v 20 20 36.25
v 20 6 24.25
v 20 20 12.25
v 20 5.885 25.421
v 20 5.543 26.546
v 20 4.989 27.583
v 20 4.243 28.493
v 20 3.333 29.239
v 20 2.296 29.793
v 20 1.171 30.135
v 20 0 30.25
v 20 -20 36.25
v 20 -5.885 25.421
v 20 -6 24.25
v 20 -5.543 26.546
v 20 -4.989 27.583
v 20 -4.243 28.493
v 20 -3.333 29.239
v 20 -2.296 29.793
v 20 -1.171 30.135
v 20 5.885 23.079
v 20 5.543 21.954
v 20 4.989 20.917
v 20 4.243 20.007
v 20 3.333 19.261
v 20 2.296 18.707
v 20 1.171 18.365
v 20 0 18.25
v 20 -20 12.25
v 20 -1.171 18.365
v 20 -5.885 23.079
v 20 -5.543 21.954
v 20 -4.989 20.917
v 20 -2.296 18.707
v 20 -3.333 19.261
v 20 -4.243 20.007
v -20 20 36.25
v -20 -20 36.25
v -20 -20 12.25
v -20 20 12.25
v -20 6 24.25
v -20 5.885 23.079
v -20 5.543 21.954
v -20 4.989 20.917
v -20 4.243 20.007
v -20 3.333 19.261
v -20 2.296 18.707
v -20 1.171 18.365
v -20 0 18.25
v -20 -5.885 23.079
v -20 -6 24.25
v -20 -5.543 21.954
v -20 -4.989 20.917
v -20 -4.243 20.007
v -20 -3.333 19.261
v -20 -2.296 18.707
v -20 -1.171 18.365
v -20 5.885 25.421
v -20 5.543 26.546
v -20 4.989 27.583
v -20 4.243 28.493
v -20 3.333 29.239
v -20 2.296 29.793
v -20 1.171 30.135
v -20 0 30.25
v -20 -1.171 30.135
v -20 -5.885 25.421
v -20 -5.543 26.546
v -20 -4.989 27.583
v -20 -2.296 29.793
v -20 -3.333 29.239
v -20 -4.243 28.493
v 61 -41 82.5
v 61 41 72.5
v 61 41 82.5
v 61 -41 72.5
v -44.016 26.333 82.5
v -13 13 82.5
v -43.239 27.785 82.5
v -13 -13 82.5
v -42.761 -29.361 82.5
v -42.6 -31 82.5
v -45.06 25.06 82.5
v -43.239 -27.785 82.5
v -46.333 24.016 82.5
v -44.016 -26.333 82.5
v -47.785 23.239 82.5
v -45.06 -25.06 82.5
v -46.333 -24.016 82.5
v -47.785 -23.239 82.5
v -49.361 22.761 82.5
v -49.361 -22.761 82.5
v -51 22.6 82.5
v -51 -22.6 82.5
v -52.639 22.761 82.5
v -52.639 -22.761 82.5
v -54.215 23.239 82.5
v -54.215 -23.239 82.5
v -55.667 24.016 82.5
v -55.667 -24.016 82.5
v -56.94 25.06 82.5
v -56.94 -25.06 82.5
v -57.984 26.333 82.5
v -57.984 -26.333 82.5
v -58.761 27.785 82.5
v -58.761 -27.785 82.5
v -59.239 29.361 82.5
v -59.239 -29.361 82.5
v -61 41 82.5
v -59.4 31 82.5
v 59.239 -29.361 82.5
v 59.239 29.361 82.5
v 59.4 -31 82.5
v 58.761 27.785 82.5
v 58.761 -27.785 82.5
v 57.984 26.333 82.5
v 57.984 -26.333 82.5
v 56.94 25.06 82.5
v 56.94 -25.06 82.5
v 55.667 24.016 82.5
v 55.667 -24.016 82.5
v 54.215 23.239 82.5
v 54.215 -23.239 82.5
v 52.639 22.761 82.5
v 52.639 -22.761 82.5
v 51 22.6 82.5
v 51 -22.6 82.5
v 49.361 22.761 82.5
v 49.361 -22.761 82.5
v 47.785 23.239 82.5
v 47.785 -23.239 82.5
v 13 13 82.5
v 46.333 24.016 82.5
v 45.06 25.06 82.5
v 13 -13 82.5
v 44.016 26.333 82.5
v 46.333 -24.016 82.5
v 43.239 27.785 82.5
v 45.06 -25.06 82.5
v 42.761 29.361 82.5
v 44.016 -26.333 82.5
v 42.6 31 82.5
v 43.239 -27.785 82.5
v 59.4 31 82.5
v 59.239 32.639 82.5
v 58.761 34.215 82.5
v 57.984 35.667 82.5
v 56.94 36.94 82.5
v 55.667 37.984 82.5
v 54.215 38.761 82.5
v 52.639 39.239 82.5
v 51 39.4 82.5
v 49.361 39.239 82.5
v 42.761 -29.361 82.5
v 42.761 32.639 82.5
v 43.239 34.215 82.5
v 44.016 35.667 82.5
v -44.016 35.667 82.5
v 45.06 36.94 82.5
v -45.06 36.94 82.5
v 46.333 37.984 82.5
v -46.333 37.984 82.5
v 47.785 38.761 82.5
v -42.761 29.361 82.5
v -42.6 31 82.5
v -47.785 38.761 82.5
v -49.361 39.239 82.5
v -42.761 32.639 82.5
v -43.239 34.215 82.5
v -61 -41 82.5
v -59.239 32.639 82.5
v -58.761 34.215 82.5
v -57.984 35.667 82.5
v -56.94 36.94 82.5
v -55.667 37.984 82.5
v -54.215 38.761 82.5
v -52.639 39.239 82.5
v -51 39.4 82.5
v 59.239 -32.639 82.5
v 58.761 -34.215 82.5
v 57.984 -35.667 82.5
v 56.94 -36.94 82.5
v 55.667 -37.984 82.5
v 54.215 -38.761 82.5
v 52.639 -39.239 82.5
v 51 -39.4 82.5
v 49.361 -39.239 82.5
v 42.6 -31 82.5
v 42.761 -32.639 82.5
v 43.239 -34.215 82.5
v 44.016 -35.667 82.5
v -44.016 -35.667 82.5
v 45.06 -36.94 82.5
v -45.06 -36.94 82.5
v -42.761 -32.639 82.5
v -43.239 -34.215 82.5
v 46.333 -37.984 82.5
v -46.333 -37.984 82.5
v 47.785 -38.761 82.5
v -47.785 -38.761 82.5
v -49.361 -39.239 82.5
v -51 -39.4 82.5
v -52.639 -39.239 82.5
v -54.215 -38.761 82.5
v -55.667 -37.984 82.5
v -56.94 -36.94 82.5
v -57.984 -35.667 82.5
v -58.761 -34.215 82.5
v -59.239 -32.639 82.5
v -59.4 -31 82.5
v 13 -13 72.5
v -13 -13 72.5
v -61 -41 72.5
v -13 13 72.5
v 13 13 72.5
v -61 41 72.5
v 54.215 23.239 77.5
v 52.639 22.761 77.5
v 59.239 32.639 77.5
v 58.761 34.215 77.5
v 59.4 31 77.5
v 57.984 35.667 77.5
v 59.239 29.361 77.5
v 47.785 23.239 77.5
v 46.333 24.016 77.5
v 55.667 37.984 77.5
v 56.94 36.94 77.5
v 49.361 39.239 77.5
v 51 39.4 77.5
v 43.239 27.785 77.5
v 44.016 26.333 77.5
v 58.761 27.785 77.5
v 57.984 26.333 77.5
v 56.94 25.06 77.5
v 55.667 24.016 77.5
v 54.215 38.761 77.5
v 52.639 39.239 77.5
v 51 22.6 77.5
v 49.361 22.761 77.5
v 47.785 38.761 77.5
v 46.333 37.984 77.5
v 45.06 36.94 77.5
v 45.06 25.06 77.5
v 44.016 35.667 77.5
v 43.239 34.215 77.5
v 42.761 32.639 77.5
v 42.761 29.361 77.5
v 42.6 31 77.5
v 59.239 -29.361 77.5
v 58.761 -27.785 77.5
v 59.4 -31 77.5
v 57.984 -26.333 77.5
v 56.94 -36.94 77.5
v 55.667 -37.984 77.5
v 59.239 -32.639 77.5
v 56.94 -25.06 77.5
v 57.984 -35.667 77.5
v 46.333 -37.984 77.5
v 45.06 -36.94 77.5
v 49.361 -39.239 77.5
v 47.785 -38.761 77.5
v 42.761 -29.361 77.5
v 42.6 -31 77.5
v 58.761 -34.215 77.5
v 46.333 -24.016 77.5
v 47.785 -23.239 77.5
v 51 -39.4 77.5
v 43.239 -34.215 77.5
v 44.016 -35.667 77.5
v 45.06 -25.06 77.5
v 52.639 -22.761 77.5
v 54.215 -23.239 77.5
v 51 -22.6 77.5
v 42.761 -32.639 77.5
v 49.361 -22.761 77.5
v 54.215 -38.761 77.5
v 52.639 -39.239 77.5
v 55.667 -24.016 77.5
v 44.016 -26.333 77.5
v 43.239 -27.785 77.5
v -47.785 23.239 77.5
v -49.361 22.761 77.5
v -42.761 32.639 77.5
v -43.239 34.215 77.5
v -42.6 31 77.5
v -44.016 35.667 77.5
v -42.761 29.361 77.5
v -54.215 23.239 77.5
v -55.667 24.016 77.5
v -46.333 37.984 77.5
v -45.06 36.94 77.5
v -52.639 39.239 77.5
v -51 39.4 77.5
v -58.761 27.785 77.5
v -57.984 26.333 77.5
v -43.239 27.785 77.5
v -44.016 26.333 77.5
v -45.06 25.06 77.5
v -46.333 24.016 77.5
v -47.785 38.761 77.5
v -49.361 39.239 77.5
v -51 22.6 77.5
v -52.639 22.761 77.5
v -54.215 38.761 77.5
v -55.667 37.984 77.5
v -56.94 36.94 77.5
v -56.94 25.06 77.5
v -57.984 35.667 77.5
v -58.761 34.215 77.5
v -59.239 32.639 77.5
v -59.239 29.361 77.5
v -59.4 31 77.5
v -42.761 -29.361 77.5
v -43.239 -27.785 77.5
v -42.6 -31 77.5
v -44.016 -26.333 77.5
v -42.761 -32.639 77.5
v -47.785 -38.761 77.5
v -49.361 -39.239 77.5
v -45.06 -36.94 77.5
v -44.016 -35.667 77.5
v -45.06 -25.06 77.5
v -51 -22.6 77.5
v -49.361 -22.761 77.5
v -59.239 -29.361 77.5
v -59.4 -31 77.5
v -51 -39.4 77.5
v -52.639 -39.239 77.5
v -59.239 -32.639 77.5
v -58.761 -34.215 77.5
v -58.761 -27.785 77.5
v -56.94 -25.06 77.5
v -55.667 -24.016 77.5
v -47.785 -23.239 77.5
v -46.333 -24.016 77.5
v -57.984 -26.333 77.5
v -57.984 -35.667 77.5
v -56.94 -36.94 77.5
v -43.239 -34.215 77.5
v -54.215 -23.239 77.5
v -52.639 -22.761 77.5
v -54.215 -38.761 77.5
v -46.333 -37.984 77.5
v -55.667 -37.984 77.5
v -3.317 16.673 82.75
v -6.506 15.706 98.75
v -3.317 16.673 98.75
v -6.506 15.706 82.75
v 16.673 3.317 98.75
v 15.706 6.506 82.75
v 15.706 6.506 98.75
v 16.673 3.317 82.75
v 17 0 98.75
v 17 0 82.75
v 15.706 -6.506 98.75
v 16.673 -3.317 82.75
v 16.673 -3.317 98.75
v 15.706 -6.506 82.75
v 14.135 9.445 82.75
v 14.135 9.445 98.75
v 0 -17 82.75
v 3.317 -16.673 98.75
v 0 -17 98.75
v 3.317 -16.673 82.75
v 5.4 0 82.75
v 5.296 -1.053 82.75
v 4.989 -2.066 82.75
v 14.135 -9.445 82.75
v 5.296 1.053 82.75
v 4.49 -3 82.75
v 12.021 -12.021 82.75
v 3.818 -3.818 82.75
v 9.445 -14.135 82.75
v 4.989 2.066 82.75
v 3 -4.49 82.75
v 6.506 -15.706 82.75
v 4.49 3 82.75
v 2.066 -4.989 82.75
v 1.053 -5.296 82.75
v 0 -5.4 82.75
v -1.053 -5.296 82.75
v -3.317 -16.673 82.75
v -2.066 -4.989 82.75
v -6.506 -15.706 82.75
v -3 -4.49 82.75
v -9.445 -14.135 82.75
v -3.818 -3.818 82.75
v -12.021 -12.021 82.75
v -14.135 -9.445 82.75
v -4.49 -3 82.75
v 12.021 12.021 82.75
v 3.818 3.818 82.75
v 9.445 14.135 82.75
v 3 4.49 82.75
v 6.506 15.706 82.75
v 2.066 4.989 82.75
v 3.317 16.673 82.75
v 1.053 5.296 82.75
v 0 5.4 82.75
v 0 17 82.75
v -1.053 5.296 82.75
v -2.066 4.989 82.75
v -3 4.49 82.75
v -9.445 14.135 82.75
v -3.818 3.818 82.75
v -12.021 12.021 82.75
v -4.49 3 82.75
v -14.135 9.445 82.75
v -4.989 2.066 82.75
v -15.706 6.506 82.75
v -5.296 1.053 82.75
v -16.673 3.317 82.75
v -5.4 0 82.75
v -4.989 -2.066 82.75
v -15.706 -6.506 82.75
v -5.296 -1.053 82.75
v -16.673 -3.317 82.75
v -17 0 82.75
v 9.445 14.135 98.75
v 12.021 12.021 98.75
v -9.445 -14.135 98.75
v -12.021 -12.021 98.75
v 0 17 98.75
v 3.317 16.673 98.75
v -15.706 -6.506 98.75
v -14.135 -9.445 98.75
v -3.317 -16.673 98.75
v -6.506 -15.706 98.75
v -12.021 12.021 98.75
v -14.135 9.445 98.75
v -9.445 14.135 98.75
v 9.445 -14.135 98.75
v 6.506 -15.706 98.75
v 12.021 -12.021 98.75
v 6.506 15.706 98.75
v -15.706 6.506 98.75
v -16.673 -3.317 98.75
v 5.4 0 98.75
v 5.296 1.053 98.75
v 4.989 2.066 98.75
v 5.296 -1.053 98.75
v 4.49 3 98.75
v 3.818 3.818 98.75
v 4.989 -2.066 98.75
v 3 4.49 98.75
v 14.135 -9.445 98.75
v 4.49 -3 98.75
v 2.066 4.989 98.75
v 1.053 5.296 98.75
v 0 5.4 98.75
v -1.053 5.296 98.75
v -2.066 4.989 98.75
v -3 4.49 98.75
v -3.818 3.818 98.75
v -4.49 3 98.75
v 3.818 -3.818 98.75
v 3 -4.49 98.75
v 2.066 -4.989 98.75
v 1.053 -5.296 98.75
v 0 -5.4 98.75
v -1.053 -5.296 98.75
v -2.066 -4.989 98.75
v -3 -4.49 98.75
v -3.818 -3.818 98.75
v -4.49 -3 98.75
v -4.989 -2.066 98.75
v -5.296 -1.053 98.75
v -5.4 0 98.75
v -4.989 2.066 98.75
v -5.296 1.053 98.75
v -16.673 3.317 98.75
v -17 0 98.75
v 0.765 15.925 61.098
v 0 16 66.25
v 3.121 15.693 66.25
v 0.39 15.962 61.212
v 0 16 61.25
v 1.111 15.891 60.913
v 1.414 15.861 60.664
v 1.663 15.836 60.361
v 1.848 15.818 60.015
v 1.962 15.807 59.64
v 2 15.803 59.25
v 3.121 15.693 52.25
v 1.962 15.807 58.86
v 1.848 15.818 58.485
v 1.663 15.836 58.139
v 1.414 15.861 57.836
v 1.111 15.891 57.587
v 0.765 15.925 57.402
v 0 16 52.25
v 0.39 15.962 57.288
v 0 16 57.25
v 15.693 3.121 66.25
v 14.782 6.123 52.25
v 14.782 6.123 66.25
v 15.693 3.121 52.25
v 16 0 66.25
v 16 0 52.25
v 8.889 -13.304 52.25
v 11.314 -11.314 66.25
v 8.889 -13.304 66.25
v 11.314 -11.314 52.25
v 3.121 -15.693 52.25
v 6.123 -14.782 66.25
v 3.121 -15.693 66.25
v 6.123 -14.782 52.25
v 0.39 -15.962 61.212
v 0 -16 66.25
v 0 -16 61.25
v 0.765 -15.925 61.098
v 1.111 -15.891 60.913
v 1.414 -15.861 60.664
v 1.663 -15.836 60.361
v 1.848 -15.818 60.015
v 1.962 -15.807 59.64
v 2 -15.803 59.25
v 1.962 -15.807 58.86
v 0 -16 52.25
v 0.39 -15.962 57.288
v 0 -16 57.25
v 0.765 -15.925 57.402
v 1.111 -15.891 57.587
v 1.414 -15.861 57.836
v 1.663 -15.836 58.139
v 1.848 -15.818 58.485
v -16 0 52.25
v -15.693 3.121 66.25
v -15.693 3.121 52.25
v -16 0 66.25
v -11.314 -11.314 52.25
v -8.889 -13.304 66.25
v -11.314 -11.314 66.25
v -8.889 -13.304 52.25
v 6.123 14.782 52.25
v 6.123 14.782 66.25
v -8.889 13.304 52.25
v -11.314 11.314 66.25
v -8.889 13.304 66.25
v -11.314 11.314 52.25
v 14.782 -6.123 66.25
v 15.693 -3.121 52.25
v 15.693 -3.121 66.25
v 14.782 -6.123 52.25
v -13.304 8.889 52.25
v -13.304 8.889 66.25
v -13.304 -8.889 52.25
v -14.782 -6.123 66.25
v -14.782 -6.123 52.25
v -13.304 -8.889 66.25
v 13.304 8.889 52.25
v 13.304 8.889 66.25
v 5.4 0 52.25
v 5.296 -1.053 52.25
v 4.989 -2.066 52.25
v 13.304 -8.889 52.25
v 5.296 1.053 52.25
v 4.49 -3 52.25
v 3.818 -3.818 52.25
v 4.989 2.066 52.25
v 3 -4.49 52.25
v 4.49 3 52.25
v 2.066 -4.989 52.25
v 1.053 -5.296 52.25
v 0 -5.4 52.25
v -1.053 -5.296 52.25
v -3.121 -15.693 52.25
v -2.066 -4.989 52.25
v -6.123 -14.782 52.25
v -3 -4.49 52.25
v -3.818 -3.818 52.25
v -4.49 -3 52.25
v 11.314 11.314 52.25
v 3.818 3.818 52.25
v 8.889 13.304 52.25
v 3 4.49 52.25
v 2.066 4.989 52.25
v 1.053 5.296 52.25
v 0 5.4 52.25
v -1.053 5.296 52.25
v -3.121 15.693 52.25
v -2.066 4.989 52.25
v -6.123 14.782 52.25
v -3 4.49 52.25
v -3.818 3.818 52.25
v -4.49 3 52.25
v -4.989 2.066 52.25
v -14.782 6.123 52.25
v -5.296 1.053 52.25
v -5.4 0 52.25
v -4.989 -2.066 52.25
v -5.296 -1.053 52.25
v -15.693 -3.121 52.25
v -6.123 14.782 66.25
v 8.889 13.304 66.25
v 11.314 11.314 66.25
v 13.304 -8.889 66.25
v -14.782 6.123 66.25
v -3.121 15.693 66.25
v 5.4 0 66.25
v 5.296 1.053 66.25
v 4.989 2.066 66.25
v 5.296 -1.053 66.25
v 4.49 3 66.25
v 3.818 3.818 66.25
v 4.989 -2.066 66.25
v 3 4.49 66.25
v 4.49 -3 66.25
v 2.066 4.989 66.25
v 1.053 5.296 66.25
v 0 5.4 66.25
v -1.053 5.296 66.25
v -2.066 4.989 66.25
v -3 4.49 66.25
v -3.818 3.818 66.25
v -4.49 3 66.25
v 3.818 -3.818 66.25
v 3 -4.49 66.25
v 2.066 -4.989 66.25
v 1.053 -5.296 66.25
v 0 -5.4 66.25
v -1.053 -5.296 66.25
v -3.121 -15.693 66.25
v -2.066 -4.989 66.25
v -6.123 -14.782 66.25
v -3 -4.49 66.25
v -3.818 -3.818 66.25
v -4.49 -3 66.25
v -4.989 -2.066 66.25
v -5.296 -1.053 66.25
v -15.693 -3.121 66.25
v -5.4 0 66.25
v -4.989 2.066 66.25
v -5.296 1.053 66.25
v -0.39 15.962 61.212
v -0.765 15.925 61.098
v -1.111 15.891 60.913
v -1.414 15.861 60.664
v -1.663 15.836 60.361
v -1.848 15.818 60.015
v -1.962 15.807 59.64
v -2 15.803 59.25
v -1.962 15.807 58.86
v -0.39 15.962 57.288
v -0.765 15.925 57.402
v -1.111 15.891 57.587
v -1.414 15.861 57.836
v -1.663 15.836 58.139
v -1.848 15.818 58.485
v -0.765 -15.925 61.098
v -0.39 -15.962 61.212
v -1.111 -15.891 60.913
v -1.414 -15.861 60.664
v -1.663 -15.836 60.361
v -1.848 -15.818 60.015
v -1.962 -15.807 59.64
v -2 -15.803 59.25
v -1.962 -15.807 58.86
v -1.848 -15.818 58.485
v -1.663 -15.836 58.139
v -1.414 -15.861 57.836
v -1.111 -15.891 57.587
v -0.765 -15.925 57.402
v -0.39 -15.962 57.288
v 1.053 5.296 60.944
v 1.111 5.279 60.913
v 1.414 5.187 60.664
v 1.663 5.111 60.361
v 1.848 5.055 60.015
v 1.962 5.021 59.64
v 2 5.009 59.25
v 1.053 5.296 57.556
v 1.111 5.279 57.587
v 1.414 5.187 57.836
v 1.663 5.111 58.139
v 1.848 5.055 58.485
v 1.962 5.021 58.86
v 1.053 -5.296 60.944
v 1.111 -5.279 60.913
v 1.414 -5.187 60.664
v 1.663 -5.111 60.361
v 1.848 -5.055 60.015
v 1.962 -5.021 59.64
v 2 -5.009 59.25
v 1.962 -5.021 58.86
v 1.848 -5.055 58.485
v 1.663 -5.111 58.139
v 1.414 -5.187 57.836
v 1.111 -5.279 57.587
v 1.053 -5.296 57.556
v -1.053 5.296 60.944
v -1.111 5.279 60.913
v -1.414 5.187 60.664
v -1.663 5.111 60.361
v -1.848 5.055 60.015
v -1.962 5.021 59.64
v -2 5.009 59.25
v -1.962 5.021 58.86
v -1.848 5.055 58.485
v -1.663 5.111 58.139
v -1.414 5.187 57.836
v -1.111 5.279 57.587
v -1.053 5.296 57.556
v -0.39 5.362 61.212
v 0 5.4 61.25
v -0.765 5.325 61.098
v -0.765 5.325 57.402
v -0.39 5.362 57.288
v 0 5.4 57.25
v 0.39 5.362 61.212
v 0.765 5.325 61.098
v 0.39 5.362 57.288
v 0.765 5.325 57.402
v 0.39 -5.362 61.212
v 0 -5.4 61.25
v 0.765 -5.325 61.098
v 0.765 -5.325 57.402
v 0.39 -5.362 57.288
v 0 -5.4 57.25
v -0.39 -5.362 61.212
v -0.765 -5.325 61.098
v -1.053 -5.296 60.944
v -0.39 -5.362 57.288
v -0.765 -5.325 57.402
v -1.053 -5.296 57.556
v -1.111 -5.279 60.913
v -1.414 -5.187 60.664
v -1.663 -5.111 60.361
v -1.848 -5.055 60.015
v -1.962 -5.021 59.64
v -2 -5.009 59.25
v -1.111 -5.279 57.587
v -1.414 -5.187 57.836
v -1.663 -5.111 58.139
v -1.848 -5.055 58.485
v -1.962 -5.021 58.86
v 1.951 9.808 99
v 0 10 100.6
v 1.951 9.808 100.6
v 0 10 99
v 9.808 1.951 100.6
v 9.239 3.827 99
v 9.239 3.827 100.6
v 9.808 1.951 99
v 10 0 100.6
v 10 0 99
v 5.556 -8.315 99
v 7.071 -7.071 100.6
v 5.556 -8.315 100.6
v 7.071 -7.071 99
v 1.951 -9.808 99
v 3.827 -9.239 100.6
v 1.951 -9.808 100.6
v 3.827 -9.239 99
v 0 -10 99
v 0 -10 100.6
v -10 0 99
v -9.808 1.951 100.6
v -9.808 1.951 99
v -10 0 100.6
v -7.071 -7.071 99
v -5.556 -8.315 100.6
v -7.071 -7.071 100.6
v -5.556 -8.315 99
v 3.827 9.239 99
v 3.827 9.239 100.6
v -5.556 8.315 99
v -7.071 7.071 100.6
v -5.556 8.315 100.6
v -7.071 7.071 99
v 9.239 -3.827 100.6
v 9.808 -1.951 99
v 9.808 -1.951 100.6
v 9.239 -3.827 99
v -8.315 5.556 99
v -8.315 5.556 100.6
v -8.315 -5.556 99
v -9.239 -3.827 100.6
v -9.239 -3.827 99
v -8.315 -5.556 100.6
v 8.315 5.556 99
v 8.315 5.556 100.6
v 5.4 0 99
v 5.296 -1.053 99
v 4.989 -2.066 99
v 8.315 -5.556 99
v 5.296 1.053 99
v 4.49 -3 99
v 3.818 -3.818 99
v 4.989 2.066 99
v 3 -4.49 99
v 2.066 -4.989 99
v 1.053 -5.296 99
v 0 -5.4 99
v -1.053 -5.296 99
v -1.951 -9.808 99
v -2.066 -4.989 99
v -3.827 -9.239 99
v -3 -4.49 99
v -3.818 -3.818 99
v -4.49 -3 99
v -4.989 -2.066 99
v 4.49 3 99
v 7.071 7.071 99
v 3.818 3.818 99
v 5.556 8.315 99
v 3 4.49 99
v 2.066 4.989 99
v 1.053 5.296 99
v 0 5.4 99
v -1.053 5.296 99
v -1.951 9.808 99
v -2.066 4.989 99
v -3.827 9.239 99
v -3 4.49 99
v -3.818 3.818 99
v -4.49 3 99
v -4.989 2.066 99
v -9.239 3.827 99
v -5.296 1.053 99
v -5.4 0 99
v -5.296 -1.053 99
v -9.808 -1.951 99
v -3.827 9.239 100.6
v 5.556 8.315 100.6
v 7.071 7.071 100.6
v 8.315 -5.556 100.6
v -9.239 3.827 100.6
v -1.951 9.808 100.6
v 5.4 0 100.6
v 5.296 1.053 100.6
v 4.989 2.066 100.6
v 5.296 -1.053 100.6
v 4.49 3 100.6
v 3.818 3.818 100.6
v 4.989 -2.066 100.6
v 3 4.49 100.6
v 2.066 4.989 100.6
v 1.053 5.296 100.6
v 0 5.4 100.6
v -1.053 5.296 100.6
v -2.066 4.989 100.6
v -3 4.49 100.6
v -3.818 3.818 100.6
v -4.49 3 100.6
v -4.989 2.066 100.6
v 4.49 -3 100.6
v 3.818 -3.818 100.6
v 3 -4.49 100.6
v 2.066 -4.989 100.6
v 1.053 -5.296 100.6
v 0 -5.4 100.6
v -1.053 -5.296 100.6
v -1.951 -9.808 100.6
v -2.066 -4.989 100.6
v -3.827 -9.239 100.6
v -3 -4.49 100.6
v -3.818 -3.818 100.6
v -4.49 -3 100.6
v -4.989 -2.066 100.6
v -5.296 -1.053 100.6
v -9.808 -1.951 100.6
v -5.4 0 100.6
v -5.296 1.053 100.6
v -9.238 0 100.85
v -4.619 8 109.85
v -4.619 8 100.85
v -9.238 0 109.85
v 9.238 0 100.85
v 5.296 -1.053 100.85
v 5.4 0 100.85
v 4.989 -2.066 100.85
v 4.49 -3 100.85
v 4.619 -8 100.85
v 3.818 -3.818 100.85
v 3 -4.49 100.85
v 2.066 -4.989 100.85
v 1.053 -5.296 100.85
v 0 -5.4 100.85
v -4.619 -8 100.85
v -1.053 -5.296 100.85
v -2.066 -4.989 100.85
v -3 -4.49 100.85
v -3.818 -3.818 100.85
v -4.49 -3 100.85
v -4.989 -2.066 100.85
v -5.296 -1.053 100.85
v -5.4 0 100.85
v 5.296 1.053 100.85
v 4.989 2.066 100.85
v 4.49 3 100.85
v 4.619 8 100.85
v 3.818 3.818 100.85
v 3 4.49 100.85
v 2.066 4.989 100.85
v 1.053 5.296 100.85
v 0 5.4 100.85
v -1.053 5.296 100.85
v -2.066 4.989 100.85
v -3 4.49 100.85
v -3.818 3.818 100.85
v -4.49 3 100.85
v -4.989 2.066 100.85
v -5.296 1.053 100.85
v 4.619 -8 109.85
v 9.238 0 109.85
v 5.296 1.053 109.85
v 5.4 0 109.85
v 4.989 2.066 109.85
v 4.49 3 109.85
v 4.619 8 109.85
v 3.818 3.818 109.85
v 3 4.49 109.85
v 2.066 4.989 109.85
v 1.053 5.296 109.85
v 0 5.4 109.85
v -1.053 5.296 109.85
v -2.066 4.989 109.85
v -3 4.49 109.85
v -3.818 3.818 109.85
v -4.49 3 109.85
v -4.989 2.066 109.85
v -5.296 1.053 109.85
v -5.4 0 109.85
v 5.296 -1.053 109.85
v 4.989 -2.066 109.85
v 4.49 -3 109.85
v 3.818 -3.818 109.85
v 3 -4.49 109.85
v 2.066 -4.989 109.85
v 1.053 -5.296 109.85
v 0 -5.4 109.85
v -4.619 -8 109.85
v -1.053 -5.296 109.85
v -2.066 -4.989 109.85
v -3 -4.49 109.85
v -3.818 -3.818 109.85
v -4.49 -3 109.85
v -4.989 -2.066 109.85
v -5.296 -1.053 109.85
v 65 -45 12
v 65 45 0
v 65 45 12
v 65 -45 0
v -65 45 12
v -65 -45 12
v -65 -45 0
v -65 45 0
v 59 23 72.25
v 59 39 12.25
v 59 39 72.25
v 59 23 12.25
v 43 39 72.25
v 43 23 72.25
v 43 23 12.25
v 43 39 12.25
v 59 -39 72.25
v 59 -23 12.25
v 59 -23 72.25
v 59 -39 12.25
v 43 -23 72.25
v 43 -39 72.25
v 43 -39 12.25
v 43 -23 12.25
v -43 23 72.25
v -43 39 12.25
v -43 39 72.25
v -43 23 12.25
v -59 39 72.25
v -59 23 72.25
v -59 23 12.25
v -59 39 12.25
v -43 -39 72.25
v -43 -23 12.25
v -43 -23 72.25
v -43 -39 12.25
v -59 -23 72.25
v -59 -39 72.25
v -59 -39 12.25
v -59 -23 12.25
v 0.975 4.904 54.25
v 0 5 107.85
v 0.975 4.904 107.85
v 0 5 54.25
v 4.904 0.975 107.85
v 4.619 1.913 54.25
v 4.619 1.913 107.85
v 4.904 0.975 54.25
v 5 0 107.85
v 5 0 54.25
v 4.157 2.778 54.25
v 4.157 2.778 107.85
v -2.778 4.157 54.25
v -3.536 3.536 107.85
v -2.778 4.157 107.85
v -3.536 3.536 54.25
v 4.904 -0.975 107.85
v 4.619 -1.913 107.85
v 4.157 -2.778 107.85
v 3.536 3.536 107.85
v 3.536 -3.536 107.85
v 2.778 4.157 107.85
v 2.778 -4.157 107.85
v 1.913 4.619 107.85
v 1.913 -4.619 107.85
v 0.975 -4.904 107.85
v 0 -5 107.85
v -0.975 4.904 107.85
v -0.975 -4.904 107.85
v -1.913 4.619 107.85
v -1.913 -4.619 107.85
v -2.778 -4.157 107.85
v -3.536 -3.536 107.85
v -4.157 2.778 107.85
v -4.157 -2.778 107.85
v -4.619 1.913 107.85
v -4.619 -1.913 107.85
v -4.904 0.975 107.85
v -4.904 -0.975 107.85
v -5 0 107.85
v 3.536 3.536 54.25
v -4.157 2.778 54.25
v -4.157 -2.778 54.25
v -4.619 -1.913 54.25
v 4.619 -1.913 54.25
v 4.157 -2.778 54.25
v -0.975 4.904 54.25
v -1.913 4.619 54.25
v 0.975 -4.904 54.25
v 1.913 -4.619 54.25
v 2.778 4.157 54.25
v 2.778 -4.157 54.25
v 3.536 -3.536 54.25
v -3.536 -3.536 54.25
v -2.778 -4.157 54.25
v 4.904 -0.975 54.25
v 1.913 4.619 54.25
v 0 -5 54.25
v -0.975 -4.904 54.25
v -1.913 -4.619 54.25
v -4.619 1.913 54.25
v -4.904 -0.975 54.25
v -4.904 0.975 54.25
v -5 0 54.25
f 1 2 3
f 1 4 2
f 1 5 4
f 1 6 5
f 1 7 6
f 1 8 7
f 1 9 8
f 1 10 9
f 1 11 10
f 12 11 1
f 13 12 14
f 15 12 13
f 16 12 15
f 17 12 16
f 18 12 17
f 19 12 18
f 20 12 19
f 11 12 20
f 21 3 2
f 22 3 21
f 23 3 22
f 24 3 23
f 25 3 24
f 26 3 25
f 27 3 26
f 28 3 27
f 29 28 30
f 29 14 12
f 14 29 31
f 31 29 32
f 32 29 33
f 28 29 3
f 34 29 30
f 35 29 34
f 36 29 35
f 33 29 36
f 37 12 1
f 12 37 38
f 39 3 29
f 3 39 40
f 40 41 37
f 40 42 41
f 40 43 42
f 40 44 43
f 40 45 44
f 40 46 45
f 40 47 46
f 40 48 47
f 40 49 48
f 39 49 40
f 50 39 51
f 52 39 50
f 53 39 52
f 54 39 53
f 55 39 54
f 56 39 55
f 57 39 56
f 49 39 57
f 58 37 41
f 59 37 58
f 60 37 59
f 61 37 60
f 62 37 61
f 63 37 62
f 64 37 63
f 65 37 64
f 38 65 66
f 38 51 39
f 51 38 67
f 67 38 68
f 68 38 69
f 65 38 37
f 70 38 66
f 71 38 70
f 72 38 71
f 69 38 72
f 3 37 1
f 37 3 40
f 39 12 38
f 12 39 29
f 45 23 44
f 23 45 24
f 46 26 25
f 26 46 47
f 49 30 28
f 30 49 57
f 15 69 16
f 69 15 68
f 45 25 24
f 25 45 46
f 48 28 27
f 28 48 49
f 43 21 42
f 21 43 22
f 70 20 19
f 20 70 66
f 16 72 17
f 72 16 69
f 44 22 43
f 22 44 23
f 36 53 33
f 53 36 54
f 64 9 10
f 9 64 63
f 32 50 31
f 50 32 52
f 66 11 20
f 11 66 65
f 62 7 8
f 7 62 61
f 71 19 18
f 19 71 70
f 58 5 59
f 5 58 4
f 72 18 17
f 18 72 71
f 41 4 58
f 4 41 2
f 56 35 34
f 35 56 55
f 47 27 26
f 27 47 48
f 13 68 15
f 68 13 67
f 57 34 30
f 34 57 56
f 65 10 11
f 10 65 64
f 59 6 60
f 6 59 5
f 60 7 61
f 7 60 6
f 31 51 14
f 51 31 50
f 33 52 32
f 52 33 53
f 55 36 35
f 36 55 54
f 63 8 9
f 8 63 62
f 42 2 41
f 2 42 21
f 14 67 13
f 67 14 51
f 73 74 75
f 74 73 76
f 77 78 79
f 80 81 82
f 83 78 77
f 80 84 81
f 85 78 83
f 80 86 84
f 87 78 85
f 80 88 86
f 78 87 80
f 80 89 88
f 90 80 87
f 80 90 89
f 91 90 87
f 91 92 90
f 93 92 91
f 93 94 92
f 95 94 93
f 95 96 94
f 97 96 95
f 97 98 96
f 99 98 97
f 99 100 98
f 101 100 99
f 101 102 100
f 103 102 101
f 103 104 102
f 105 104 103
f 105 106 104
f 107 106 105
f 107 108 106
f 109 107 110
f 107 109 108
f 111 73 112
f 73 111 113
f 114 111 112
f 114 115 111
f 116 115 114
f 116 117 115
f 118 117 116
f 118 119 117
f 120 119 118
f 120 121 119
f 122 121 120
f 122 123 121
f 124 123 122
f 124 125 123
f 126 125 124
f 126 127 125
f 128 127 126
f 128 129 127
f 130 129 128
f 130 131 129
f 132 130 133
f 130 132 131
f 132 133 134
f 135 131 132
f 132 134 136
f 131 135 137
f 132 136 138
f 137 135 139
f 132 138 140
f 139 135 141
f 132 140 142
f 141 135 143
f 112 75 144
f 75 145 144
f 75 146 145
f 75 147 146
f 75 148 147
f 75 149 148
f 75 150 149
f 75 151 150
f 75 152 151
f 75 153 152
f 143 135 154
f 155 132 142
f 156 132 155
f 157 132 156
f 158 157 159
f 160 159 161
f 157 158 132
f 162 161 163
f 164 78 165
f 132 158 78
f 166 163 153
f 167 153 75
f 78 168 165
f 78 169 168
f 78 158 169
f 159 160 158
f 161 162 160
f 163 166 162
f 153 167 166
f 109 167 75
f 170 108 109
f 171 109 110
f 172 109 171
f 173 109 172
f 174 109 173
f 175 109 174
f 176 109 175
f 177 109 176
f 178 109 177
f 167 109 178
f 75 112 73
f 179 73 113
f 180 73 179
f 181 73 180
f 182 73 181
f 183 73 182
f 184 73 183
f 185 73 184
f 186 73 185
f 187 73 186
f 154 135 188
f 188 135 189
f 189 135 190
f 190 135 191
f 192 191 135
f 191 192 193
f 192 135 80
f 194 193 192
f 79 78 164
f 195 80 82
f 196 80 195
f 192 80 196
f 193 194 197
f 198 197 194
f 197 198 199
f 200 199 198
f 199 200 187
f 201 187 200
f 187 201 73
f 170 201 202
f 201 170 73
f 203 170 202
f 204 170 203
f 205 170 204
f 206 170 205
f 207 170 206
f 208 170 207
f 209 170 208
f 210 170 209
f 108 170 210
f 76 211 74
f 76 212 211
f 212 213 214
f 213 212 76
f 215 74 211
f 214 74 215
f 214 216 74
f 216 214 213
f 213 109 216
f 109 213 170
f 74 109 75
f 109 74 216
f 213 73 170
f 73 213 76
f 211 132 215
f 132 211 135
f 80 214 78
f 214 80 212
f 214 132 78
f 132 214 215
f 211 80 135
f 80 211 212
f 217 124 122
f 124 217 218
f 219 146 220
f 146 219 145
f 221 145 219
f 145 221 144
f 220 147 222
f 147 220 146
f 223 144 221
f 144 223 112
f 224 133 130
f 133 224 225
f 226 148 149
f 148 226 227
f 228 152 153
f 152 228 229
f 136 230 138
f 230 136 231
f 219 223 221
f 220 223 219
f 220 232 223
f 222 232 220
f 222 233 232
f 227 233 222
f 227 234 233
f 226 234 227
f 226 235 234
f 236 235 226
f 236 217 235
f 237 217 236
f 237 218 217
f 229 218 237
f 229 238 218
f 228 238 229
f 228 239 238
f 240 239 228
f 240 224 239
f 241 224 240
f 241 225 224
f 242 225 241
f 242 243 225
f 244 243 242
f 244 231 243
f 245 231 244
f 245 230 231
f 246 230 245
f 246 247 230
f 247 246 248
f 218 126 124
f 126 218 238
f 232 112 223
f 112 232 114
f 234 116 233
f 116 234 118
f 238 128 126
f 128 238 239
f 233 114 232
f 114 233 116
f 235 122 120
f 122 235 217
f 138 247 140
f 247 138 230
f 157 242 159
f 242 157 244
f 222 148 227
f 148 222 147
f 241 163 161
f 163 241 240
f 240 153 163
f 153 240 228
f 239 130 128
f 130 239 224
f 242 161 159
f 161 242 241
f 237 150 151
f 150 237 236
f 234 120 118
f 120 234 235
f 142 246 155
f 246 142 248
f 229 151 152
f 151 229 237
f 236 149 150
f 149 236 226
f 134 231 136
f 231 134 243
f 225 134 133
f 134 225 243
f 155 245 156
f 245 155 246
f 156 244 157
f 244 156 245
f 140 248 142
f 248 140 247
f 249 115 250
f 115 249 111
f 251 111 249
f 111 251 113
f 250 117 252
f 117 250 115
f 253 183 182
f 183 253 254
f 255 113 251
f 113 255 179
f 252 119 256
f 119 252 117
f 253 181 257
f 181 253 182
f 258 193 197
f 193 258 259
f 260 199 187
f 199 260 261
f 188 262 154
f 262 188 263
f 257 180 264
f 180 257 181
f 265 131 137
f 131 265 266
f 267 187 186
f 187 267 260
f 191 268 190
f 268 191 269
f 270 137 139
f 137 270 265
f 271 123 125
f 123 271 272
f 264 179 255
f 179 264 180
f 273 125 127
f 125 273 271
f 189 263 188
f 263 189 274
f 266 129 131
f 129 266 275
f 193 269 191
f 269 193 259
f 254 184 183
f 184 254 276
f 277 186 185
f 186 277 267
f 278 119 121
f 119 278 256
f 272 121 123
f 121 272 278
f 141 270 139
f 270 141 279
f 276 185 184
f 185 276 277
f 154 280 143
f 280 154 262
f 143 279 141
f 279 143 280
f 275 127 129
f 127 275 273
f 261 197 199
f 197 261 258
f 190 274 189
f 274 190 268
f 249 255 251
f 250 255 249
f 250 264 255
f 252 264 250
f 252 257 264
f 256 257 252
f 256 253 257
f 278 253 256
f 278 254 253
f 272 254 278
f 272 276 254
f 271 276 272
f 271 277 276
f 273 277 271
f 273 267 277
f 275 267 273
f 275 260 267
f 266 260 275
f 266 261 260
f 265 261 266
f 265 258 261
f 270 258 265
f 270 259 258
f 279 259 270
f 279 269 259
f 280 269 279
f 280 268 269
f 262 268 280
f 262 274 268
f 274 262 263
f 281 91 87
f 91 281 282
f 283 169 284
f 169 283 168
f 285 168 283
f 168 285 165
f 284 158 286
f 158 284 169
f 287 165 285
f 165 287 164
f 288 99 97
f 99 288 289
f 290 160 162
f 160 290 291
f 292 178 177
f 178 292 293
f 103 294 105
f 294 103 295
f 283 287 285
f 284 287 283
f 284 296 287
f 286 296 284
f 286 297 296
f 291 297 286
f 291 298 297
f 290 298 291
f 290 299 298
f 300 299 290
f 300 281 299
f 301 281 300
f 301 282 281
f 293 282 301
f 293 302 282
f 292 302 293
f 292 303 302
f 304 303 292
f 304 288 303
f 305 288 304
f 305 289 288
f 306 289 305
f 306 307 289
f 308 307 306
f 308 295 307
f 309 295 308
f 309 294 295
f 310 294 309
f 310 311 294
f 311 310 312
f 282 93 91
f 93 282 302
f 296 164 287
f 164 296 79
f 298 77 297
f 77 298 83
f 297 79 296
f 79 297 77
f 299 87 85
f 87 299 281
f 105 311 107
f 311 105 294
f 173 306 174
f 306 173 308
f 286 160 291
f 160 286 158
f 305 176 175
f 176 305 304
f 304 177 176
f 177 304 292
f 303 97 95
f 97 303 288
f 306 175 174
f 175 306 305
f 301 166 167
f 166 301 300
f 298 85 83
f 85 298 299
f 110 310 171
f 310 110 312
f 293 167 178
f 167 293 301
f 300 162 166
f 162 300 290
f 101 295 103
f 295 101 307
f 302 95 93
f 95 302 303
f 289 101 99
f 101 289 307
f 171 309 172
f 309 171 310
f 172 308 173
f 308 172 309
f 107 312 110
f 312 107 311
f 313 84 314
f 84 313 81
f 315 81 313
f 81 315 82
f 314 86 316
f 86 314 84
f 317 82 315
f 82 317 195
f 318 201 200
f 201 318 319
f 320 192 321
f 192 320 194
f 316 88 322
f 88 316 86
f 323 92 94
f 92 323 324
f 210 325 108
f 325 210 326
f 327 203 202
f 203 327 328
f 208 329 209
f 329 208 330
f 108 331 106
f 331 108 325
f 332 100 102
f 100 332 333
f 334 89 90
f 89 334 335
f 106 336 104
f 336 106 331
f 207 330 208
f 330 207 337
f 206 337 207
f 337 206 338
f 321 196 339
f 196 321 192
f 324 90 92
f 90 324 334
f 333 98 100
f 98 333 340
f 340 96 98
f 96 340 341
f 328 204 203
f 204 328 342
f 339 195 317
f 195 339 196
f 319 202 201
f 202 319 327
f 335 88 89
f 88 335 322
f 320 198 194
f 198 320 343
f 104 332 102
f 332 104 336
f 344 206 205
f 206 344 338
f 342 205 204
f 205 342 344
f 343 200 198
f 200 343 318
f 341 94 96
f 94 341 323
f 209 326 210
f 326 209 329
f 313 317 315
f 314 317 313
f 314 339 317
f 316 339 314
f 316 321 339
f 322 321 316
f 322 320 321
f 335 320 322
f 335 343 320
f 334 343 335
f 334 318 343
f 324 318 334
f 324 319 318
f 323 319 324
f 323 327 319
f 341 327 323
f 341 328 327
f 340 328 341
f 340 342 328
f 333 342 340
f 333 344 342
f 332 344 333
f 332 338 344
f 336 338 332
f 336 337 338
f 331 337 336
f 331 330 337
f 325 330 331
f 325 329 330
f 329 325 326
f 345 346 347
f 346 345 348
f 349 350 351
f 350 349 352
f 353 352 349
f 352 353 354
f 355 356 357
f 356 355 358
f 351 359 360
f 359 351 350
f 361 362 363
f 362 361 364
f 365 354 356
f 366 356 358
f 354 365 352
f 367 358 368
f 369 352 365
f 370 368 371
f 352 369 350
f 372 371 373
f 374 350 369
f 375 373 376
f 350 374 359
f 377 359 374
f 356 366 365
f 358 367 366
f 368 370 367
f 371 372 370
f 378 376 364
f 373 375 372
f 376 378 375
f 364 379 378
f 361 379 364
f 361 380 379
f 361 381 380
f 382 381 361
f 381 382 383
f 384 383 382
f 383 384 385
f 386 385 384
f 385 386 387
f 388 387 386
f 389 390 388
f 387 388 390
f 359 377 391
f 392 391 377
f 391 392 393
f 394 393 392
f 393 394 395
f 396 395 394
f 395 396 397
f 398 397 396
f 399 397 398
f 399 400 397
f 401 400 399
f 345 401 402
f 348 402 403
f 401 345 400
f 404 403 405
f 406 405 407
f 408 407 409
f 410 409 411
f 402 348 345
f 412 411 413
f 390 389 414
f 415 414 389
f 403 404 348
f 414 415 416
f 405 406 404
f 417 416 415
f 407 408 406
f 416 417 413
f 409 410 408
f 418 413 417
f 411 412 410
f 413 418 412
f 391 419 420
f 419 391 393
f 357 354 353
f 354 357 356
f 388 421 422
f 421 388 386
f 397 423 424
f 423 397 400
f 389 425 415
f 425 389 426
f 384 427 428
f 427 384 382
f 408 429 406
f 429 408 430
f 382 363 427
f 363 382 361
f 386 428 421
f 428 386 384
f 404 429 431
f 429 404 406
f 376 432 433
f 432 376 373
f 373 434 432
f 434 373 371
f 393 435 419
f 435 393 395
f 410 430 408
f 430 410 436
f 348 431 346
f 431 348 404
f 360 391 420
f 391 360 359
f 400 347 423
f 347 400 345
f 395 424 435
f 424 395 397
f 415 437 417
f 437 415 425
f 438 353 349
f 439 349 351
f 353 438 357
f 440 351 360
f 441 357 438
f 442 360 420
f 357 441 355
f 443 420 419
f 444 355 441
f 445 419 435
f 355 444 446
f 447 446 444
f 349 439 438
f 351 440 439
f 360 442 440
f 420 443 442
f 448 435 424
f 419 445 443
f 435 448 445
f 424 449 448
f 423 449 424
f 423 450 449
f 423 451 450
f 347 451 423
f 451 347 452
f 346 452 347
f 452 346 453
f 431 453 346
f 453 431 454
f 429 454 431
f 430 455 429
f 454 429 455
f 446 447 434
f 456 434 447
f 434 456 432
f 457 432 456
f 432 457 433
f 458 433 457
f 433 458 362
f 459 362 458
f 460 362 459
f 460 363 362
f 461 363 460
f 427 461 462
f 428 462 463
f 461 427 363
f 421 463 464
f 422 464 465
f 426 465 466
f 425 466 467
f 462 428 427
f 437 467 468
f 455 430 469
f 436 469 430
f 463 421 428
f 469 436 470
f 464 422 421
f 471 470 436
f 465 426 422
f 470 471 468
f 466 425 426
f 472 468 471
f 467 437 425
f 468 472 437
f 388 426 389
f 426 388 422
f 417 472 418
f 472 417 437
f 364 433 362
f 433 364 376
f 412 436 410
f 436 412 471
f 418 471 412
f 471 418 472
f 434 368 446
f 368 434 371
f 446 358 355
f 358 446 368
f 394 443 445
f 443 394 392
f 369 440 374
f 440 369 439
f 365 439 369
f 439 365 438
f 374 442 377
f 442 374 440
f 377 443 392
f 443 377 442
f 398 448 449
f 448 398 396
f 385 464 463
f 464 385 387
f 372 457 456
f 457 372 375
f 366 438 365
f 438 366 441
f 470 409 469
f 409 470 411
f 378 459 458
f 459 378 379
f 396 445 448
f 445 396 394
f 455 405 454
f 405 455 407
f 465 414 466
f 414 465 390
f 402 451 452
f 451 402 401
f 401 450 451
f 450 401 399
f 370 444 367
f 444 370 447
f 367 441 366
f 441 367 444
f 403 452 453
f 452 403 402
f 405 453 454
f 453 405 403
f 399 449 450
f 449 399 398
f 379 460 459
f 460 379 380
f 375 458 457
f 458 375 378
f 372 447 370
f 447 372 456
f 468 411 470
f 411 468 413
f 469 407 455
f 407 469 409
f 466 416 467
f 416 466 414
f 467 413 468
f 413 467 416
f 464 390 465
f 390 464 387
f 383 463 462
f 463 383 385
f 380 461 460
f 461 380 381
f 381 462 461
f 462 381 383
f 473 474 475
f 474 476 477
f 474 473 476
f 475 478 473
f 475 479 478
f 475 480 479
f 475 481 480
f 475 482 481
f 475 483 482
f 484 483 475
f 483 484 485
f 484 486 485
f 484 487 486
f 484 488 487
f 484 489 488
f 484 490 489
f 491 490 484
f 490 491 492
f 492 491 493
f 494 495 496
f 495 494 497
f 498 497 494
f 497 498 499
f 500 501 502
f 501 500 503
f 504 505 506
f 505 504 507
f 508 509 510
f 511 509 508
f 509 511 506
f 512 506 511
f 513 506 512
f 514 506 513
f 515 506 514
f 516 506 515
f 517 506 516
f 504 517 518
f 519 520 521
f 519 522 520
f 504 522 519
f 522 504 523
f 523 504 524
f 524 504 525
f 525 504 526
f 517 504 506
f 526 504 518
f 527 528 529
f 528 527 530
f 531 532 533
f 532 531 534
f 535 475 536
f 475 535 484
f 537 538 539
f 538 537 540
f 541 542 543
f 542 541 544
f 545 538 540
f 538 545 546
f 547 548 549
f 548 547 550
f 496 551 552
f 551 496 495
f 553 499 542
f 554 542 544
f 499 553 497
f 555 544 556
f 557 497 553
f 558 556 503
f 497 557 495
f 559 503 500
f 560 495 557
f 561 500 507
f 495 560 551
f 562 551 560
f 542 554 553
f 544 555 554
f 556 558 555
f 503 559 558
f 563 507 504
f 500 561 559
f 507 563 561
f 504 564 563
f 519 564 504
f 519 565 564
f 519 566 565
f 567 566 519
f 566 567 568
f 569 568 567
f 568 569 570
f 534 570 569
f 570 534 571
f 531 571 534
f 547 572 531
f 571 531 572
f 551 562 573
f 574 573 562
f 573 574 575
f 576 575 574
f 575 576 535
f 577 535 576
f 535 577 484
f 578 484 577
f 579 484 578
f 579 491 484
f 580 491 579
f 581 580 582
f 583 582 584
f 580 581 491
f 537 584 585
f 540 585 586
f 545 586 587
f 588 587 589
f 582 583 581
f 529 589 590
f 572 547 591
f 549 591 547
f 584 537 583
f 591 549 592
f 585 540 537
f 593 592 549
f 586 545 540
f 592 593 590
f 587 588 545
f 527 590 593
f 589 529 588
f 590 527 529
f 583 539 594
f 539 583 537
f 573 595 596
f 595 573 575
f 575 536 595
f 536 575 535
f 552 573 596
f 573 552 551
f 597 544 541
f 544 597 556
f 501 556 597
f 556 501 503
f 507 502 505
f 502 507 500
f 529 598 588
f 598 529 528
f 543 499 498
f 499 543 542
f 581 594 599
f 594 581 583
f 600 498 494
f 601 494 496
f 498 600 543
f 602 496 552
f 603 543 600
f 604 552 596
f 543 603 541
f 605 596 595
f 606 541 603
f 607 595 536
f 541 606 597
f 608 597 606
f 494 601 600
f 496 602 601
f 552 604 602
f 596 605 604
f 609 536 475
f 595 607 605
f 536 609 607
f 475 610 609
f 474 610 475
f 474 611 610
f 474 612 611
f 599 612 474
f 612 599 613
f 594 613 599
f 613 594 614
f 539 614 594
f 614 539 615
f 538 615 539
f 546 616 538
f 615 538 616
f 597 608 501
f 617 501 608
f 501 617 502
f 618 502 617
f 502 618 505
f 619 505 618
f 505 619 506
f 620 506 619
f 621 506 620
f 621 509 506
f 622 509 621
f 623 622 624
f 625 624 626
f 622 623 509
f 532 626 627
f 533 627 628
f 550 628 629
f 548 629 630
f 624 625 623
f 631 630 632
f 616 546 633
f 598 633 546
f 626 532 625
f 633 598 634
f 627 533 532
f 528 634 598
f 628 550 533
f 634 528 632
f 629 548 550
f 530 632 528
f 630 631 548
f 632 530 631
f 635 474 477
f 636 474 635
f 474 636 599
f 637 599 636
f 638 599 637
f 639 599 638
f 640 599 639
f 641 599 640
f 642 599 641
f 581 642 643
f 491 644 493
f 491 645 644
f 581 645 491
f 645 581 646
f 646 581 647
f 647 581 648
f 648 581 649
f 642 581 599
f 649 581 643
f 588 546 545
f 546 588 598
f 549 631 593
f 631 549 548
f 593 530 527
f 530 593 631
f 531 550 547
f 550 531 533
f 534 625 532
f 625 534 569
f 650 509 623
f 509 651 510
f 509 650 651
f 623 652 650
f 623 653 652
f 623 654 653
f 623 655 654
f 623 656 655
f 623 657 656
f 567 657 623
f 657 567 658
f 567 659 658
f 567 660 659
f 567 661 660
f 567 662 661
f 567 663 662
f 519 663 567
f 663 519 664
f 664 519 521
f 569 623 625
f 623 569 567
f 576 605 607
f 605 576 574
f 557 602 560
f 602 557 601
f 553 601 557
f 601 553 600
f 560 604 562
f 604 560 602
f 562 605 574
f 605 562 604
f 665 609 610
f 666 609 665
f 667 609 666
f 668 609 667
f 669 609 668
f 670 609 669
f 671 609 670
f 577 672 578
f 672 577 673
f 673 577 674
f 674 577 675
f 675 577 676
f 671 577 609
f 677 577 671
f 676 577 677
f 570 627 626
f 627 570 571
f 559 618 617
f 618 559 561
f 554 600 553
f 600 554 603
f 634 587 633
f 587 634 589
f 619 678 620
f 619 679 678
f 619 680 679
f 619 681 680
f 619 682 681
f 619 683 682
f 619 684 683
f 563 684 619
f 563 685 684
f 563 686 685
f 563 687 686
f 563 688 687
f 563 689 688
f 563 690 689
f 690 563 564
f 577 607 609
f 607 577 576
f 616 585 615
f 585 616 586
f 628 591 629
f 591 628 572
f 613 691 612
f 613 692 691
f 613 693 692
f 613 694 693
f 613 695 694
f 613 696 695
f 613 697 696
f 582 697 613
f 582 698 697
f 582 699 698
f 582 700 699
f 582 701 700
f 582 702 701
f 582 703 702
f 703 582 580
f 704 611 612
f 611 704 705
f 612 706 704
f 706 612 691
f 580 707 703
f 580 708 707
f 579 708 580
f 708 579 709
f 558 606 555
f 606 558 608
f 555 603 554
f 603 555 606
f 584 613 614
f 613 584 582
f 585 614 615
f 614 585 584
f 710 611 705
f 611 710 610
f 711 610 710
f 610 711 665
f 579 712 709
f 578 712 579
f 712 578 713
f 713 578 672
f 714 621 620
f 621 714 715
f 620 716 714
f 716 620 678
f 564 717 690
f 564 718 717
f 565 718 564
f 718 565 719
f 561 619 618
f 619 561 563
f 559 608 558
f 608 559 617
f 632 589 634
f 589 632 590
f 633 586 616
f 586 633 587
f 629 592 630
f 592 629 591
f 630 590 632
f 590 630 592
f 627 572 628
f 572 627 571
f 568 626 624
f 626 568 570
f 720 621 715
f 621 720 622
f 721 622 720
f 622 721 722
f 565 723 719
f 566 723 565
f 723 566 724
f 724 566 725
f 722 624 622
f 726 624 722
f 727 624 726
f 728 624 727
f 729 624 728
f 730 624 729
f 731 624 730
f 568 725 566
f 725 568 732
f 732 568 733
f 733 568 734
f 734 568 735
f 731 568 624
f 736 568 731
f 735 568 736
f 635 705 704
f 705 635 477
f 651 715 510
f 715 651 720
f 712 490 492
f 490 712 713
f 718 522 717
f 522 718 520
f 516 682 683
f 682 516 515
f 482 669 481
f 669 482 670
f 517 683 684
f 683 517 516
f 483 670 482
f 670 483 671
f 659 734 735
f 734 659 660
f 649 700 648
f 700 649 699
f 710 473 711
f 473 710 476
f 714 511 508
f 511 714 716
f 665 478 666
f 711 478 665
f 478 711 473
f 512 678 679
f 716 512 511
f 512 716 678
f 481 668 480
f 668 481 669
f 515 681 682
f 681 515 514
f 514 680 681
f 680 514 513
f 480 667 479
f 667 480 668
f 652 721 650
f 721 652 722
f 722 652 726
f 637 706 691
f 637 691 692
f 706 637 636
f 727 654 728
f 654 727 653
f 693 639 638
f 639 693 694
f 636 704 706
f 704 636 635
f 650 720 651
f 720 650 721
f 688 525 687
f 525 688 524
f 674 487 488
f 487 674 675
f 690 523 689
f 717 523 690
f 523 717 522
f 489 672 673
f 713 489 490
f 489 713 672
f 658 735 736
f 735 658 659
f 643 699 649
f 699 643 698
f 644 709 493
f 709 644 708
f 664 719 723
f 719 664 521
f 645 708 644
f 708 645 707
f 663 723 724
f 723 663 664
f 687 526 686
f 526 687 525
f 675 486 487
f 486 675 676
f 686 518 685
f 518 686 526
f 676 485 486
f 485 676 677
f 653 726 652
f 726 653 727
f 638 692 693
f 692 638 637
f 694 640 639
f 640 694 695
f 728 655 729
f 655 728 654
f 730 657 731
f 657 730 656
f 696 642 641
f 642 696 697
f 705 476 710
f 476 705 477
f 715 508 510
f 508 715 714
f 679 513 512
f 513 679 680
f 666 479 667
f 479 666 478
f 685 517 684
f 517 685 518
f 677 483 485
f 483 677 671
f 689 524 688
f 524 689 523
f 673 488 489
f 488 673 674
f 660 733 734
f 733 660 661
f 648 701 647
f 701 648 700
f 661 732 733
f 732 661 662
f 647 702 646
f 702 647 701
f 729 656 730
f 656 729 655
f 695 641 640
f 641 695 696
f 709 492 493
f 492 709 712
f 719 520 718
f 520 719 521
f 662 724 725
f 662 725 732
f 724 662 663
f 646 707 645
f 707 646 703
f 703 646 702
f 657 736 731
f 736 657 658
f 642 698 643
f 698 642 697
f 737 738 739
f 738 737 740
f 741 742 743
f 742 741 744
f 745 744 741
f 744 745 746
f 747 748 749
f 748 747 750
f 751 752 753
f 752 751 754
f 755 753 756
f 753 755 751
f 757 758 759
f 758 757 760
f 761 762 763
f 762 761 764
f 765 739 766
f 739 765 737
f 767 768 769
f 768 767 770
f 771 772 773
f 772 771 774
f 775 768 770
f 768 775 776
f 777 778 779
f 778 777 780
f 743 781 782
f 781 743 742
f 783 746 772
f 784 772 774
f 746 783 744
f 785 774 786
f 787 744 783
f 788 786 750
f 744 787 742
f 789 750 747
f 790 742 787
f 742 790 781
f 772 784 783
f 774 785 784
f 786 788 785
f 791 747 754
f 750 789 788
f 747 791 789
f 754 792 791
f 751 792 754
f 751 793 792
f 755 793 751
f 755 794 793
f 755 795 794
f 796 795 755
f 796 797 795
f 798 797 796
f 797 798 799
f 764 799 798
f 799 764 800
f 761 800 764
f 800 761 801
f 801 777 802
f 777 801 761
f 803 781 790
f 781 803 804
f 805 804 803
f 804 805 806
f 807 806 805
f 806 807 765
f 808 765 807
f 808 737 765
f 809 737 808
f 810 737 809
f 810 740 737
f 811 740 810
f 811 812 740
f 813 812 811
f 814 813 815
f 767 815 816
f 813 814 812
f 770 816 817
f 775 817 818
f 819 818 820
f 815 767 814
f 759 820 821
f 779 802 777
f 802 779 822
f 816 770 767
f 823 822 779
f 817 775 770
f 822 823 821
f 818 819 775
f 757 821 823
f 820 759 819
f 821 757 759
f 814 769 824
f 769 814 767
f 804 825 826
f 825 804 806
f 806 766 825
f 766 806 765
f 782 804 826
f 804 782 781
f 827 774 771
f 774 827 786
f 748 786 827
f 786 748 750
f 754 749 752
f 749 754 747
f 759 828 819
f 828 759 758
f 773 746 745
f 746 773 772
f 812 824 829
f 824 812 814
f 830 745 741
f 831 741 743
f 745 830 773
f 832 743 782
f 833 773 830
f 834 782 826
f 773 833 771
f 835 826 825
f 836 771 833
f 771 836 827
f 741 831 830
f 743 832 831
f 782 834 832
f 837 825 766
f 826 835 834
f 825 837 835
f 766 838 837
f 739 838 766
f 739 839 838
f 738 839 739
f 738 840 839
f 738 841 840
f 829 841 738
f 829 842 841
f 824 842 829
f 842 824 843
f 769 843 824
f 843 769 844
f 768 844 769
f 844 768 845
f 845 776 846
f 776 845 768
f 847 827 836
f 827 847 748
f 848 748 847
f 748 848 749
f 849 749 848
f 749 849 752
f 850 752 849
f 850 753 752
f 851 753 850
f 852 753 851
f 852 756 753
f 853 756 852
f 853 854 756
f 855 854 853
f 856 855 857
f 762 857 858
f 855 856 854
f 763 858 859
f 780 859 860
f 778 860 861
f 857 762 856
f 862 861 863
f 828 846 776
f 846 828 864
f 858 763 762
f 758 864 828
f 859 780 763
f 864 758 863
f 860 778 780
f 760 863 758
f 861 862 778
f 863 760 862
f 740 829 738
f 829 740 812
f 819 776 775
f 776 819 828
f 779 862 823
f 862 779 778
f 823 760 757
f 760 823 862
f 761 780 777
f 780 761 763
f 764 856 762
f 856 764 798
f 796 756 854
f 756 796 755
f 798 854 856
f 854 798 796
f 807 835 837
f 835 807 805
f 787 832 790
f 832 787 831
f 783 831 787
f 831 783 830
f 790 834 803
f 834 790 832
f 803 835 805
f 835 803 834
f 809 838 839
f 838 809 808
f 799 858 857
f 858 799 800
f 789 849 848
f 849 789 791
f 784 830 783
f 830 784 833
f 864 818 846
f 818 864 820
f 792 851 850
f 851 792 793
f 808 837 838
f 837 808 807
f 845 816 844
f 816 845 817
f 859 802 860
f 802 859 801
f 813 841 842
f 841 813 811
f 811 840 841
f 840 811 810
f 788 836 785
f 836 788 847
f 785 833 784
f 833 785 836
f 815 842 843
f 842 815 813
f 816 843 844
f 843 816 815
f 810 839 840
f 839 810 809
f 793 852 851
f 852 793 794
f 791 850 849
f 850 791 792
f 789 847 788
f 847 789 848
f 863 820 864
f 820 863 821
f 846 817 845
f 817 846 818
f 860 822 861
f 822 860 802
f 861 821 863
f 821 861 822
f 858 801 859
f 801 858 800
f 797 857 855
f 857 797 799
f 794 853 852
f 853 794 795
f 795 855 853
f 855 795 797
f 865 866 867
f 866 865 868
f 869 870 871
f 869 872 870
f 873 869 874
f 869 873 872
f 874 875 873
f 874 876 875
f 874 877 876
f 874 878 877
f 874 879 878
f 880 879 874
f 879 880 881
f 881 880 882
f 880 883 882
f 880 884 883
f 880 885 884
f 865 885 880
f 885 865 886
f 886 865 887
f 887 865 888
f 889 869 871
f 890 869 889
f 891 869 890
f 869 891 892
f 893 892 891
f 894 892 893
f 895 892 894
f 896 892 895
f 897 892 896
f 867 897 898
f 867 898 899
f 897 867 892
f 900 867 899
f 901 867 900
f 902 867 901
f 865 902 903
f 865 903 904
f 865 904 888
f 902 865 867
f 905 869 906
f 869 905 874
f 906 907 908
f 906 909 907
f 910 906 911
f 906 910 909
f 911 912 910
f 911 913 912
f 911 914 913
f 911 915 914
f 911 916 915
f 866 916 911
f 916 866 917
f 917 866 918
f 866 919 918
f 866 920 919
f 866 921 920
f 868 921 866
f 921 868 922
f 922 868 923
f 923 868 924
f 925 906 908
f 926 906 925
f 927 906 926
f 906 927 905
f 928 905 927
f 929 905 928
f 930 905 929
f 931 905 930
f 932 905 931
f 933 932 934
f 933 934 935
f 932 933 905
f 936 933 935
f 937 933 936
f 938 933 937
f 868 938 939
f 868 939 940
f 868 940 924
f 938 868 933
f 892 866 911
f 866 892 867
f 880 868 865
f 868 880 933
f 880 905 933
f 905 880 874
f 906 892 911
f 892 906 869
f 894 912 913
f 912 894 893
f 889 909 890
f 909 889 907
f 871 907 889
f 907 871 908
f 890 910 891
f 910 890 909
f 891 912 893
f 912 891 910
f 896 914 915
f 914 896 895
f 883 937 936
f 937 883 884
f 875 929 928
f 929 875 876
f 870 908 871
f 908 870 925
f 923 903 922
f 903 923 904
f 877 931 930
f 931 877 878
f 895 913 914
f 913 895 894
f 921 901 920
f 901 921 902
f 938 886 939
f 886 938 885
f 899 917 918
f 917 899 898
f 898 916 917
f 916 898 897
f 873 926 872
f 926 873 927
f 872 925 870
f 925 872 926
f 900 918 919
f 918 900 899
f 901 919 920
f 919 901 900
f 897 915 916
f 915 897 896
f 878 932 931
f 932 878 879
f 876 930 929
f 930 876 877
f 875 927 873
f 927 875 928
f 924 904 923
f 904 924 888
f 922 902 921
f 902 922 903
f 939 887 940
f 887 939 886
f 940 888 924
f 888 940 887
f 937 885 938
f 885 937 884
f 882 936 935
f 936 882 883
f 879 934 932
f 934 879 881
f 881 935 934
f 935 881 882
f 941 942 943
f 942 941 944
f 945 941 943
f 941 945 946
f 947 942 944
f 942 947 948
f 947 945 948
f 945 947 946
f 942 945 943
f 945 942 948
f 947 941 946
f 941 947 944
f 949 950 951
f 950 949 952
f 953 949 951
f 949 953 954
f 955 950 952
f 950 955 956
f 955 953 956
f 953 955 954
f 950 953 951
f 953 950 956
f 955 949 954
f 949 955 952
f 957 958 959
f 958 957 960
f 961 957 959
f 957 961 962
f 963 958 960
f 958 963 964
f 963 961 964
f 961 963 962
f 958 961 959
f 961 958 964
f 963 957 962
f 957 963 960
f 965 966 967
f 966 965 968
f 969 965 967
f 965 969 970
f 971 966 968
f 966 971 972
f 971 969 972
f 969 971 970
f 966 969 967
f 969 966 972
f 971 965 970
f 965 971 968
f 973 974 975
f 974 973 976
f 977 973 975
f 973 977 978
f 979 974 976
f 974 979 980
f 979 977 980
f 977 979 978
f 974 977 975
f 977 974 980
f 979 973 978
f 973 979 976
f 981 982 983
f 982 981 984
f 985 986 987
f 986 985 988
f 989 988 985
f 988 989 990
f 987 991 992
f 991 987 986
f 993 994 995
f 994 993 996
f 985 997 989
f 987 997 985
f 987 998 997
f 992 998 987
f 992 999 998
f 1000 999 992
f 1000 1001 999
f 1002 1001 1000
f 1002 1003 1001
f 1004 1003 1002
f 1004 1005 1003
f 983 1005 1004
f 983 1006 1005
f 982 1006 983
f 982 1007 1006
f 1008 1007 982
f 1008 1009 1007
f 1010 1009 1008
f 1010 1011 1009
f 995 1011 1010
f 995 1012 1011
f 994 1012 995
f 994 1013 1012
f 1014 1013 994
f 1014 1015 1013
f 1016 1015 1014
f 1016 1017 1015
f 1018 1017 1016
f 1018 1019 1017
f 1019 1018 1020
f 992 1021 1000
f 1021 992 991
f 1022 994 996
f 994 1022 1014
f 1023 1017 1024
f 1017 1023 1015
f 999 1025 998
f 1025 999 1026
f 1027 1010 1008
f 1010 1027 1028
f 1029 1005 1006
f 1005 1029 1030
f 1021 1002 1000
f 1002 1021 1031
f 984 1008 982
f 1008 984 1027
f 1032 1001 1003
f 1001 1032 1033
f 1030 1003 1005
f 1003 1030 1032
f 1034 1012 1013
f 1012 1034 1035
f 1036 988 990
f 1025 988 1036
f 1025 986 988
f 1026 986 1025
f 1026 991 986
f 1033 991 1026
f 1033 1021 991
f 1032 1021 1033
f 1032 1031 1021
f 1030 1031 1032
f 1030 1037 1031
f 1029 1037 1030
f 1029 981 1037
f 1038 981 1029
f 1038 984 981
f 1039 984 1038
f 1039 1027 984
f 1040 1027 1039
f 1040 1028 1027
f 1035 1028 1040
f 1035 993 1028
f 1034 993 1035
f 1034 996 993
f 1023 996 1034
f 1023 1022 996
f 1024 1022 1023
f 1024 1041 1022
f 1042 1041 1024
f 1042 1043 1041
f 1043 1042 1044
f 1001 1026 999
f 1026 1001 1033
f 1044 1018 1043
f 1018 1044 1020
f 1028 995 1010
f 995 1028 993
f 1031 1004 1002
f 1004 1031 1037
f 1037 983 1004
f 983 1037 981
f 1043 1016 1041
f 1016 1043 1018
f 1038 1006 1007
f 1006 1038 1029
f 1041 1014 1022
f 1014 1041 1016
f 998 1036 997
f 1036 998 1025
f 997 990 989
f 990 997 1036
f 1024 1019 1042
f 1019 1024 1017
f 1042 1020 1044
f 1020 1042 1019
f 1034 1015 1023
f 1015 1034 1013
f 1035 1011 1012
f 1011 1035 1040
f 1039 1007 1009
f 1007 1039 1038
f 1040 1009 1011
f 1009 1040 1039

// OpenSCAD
$fn = 32;

// ------------------------------------------------------------------------
// Arbor press fixture: screw d10, posts 60 mm, gap 16 mm
// Every part is its own module, assembly() places every instance.
// ------------------------------------------------------------------------

// --- part 1 ---
module press_bed() {
  difference() {
    translate([-65, -45, 0]) cube([130, 90, 12]);
  }
}

// --- part 2 ---
module anvil_block() {
  difference() {
    translate([-20, -20, 0]) cube([40, 40, 24]);
    translate([0, 0, 12]) rotate([0, 90, 0]) cylinder(h = 42, d = 12, center = true);
  }
}

// --- part 3 ---
module press_post_a() {
  translate([-8, -8, 0]) cube([16, 16, 60]);
}

// --- part 4 ---
module press_post_b() {
  translate([-8, -8, 0]) cube([16, 16, 60]);
}

// --- part 5 ---
module press_post_c() {
  translate([-8, -8, 0]) cube([16, 16, 60]);
}

// --- part 6 ---
module press_post_d() {
  translate([-8, -8, 0]) cube([16, 16, 60]);
}

// --- part 7 ---
module press_frame() {
  difference() {
    translate([-61, -41, 0]) cube([122, 82, 10]);
    translate([-13, -13, -1]) cube([26, 26, 12]);
    translate([51, 31, 5]) cylinder(h = 6, d = 16.8);
    translate([51, -31, 5]) cylinder(h = 6, d = 16.8);
    translate([-51, 31, 5]) cylinder(h = 6, d = 16.8);
    translate([-51, -31, 5]) cylinder(h = 6, d = 16.8);
  }
}

// --- part 8 ---
module guide_ring() {
  difference() {
      translate([0, 0, 0]) cylinder(h = 16, d = 34);
      translate([0, 0, -1]) cylinder(h = 18, d = 10.8);
    }
}

// --- part 9 ---
module press_screw() {
  translate([0, 0, -26.8]) cylinder(h = 53.6, d = 10);
}

// --- part 10 ---
module press_head() {
  difference() {
    cylinder(h = 14, d = 32);
    translate([0, 0, -1]) cylinder(h = 16, d = 10.8);
    translate([0, 0, 7]) rotate([90, 0, 0]) cylinder(h = 34, d = 4, center = true);
  }
}

// --- part 11 ---
module nut_washer() {
  difference() {
      translate([0, 0, 0]) cylinder(h = 1.6, d = 20);
      translate([0, 0, -1]) cylinder(h = 3.6, d = 10.8);
    }
}

// --- part 12 ---
module press_nut() {
  difference() {
    linear_extrude(height = 9) polygon(points = [[9.238, 0], [4.619, 8], [-4.619, 8], [-9.238, 0], [-4.619, -8], [4.619, -8]]);
    translate([0, 0, -1]) cylinder(h = 11, d = 10.8);
  }
}

// --- assembly ---
module assembly() {
  color([0.80, 0.24, 0.20]) translate([0, 0, 0]) rotate([0, 0, 0]) press_bed();
  color([0.20, 0.45, 0.75]) translate([0, 0, 12.25]) rotate([0, 0, 0]) anvil_block();
  color([0.25, 0.62, 0.32]) translate([51, 31, 12.25]) rotate([0, 0, 0]) press_post_a();
  color([0.92, 0.70, 0.18]) translate([51, -31, 12.25]) rotate([0, 0, 0]) press_post_b();
  color([0.58, 0.35, 0.70]) translate([-51, 31, 12.25]) rotate([0, 0, 0]) press_post_c();
  color([0.16, 0.66, 0.66]) translate([-51, -31, 12.25]) rotate([0, 0, 0]) press_post_d();
  color([0.85, 0.48, 0.18]) translate([0, 0, 72.5]) rotate([0, 0, 0]) press_frame();
  color([0.55, 0.60, 0.65]) translate([0, 0, 82.75]) rotate([0, 0, 0]) guide_ring();
  color([0.75, 0.30, 0.55]) translate([0, 0, 81.05]) rotate([0, 0, 0]) press_screw();
  color([0.42, 0.52, 0.28]) translate([0, 0, 52.25]) rotate([0, 0, 0]) press_head();
  color([0.80, 0.24, 0.20]) translate([0, 0, 99]) rotate([0, 0, 0]) nut_washer();
  color([0.20, 0.45, 0.75]) translate([0, 0, 100.85]) rotate([0, 0, 0]) press_nut();
}

assembly();
